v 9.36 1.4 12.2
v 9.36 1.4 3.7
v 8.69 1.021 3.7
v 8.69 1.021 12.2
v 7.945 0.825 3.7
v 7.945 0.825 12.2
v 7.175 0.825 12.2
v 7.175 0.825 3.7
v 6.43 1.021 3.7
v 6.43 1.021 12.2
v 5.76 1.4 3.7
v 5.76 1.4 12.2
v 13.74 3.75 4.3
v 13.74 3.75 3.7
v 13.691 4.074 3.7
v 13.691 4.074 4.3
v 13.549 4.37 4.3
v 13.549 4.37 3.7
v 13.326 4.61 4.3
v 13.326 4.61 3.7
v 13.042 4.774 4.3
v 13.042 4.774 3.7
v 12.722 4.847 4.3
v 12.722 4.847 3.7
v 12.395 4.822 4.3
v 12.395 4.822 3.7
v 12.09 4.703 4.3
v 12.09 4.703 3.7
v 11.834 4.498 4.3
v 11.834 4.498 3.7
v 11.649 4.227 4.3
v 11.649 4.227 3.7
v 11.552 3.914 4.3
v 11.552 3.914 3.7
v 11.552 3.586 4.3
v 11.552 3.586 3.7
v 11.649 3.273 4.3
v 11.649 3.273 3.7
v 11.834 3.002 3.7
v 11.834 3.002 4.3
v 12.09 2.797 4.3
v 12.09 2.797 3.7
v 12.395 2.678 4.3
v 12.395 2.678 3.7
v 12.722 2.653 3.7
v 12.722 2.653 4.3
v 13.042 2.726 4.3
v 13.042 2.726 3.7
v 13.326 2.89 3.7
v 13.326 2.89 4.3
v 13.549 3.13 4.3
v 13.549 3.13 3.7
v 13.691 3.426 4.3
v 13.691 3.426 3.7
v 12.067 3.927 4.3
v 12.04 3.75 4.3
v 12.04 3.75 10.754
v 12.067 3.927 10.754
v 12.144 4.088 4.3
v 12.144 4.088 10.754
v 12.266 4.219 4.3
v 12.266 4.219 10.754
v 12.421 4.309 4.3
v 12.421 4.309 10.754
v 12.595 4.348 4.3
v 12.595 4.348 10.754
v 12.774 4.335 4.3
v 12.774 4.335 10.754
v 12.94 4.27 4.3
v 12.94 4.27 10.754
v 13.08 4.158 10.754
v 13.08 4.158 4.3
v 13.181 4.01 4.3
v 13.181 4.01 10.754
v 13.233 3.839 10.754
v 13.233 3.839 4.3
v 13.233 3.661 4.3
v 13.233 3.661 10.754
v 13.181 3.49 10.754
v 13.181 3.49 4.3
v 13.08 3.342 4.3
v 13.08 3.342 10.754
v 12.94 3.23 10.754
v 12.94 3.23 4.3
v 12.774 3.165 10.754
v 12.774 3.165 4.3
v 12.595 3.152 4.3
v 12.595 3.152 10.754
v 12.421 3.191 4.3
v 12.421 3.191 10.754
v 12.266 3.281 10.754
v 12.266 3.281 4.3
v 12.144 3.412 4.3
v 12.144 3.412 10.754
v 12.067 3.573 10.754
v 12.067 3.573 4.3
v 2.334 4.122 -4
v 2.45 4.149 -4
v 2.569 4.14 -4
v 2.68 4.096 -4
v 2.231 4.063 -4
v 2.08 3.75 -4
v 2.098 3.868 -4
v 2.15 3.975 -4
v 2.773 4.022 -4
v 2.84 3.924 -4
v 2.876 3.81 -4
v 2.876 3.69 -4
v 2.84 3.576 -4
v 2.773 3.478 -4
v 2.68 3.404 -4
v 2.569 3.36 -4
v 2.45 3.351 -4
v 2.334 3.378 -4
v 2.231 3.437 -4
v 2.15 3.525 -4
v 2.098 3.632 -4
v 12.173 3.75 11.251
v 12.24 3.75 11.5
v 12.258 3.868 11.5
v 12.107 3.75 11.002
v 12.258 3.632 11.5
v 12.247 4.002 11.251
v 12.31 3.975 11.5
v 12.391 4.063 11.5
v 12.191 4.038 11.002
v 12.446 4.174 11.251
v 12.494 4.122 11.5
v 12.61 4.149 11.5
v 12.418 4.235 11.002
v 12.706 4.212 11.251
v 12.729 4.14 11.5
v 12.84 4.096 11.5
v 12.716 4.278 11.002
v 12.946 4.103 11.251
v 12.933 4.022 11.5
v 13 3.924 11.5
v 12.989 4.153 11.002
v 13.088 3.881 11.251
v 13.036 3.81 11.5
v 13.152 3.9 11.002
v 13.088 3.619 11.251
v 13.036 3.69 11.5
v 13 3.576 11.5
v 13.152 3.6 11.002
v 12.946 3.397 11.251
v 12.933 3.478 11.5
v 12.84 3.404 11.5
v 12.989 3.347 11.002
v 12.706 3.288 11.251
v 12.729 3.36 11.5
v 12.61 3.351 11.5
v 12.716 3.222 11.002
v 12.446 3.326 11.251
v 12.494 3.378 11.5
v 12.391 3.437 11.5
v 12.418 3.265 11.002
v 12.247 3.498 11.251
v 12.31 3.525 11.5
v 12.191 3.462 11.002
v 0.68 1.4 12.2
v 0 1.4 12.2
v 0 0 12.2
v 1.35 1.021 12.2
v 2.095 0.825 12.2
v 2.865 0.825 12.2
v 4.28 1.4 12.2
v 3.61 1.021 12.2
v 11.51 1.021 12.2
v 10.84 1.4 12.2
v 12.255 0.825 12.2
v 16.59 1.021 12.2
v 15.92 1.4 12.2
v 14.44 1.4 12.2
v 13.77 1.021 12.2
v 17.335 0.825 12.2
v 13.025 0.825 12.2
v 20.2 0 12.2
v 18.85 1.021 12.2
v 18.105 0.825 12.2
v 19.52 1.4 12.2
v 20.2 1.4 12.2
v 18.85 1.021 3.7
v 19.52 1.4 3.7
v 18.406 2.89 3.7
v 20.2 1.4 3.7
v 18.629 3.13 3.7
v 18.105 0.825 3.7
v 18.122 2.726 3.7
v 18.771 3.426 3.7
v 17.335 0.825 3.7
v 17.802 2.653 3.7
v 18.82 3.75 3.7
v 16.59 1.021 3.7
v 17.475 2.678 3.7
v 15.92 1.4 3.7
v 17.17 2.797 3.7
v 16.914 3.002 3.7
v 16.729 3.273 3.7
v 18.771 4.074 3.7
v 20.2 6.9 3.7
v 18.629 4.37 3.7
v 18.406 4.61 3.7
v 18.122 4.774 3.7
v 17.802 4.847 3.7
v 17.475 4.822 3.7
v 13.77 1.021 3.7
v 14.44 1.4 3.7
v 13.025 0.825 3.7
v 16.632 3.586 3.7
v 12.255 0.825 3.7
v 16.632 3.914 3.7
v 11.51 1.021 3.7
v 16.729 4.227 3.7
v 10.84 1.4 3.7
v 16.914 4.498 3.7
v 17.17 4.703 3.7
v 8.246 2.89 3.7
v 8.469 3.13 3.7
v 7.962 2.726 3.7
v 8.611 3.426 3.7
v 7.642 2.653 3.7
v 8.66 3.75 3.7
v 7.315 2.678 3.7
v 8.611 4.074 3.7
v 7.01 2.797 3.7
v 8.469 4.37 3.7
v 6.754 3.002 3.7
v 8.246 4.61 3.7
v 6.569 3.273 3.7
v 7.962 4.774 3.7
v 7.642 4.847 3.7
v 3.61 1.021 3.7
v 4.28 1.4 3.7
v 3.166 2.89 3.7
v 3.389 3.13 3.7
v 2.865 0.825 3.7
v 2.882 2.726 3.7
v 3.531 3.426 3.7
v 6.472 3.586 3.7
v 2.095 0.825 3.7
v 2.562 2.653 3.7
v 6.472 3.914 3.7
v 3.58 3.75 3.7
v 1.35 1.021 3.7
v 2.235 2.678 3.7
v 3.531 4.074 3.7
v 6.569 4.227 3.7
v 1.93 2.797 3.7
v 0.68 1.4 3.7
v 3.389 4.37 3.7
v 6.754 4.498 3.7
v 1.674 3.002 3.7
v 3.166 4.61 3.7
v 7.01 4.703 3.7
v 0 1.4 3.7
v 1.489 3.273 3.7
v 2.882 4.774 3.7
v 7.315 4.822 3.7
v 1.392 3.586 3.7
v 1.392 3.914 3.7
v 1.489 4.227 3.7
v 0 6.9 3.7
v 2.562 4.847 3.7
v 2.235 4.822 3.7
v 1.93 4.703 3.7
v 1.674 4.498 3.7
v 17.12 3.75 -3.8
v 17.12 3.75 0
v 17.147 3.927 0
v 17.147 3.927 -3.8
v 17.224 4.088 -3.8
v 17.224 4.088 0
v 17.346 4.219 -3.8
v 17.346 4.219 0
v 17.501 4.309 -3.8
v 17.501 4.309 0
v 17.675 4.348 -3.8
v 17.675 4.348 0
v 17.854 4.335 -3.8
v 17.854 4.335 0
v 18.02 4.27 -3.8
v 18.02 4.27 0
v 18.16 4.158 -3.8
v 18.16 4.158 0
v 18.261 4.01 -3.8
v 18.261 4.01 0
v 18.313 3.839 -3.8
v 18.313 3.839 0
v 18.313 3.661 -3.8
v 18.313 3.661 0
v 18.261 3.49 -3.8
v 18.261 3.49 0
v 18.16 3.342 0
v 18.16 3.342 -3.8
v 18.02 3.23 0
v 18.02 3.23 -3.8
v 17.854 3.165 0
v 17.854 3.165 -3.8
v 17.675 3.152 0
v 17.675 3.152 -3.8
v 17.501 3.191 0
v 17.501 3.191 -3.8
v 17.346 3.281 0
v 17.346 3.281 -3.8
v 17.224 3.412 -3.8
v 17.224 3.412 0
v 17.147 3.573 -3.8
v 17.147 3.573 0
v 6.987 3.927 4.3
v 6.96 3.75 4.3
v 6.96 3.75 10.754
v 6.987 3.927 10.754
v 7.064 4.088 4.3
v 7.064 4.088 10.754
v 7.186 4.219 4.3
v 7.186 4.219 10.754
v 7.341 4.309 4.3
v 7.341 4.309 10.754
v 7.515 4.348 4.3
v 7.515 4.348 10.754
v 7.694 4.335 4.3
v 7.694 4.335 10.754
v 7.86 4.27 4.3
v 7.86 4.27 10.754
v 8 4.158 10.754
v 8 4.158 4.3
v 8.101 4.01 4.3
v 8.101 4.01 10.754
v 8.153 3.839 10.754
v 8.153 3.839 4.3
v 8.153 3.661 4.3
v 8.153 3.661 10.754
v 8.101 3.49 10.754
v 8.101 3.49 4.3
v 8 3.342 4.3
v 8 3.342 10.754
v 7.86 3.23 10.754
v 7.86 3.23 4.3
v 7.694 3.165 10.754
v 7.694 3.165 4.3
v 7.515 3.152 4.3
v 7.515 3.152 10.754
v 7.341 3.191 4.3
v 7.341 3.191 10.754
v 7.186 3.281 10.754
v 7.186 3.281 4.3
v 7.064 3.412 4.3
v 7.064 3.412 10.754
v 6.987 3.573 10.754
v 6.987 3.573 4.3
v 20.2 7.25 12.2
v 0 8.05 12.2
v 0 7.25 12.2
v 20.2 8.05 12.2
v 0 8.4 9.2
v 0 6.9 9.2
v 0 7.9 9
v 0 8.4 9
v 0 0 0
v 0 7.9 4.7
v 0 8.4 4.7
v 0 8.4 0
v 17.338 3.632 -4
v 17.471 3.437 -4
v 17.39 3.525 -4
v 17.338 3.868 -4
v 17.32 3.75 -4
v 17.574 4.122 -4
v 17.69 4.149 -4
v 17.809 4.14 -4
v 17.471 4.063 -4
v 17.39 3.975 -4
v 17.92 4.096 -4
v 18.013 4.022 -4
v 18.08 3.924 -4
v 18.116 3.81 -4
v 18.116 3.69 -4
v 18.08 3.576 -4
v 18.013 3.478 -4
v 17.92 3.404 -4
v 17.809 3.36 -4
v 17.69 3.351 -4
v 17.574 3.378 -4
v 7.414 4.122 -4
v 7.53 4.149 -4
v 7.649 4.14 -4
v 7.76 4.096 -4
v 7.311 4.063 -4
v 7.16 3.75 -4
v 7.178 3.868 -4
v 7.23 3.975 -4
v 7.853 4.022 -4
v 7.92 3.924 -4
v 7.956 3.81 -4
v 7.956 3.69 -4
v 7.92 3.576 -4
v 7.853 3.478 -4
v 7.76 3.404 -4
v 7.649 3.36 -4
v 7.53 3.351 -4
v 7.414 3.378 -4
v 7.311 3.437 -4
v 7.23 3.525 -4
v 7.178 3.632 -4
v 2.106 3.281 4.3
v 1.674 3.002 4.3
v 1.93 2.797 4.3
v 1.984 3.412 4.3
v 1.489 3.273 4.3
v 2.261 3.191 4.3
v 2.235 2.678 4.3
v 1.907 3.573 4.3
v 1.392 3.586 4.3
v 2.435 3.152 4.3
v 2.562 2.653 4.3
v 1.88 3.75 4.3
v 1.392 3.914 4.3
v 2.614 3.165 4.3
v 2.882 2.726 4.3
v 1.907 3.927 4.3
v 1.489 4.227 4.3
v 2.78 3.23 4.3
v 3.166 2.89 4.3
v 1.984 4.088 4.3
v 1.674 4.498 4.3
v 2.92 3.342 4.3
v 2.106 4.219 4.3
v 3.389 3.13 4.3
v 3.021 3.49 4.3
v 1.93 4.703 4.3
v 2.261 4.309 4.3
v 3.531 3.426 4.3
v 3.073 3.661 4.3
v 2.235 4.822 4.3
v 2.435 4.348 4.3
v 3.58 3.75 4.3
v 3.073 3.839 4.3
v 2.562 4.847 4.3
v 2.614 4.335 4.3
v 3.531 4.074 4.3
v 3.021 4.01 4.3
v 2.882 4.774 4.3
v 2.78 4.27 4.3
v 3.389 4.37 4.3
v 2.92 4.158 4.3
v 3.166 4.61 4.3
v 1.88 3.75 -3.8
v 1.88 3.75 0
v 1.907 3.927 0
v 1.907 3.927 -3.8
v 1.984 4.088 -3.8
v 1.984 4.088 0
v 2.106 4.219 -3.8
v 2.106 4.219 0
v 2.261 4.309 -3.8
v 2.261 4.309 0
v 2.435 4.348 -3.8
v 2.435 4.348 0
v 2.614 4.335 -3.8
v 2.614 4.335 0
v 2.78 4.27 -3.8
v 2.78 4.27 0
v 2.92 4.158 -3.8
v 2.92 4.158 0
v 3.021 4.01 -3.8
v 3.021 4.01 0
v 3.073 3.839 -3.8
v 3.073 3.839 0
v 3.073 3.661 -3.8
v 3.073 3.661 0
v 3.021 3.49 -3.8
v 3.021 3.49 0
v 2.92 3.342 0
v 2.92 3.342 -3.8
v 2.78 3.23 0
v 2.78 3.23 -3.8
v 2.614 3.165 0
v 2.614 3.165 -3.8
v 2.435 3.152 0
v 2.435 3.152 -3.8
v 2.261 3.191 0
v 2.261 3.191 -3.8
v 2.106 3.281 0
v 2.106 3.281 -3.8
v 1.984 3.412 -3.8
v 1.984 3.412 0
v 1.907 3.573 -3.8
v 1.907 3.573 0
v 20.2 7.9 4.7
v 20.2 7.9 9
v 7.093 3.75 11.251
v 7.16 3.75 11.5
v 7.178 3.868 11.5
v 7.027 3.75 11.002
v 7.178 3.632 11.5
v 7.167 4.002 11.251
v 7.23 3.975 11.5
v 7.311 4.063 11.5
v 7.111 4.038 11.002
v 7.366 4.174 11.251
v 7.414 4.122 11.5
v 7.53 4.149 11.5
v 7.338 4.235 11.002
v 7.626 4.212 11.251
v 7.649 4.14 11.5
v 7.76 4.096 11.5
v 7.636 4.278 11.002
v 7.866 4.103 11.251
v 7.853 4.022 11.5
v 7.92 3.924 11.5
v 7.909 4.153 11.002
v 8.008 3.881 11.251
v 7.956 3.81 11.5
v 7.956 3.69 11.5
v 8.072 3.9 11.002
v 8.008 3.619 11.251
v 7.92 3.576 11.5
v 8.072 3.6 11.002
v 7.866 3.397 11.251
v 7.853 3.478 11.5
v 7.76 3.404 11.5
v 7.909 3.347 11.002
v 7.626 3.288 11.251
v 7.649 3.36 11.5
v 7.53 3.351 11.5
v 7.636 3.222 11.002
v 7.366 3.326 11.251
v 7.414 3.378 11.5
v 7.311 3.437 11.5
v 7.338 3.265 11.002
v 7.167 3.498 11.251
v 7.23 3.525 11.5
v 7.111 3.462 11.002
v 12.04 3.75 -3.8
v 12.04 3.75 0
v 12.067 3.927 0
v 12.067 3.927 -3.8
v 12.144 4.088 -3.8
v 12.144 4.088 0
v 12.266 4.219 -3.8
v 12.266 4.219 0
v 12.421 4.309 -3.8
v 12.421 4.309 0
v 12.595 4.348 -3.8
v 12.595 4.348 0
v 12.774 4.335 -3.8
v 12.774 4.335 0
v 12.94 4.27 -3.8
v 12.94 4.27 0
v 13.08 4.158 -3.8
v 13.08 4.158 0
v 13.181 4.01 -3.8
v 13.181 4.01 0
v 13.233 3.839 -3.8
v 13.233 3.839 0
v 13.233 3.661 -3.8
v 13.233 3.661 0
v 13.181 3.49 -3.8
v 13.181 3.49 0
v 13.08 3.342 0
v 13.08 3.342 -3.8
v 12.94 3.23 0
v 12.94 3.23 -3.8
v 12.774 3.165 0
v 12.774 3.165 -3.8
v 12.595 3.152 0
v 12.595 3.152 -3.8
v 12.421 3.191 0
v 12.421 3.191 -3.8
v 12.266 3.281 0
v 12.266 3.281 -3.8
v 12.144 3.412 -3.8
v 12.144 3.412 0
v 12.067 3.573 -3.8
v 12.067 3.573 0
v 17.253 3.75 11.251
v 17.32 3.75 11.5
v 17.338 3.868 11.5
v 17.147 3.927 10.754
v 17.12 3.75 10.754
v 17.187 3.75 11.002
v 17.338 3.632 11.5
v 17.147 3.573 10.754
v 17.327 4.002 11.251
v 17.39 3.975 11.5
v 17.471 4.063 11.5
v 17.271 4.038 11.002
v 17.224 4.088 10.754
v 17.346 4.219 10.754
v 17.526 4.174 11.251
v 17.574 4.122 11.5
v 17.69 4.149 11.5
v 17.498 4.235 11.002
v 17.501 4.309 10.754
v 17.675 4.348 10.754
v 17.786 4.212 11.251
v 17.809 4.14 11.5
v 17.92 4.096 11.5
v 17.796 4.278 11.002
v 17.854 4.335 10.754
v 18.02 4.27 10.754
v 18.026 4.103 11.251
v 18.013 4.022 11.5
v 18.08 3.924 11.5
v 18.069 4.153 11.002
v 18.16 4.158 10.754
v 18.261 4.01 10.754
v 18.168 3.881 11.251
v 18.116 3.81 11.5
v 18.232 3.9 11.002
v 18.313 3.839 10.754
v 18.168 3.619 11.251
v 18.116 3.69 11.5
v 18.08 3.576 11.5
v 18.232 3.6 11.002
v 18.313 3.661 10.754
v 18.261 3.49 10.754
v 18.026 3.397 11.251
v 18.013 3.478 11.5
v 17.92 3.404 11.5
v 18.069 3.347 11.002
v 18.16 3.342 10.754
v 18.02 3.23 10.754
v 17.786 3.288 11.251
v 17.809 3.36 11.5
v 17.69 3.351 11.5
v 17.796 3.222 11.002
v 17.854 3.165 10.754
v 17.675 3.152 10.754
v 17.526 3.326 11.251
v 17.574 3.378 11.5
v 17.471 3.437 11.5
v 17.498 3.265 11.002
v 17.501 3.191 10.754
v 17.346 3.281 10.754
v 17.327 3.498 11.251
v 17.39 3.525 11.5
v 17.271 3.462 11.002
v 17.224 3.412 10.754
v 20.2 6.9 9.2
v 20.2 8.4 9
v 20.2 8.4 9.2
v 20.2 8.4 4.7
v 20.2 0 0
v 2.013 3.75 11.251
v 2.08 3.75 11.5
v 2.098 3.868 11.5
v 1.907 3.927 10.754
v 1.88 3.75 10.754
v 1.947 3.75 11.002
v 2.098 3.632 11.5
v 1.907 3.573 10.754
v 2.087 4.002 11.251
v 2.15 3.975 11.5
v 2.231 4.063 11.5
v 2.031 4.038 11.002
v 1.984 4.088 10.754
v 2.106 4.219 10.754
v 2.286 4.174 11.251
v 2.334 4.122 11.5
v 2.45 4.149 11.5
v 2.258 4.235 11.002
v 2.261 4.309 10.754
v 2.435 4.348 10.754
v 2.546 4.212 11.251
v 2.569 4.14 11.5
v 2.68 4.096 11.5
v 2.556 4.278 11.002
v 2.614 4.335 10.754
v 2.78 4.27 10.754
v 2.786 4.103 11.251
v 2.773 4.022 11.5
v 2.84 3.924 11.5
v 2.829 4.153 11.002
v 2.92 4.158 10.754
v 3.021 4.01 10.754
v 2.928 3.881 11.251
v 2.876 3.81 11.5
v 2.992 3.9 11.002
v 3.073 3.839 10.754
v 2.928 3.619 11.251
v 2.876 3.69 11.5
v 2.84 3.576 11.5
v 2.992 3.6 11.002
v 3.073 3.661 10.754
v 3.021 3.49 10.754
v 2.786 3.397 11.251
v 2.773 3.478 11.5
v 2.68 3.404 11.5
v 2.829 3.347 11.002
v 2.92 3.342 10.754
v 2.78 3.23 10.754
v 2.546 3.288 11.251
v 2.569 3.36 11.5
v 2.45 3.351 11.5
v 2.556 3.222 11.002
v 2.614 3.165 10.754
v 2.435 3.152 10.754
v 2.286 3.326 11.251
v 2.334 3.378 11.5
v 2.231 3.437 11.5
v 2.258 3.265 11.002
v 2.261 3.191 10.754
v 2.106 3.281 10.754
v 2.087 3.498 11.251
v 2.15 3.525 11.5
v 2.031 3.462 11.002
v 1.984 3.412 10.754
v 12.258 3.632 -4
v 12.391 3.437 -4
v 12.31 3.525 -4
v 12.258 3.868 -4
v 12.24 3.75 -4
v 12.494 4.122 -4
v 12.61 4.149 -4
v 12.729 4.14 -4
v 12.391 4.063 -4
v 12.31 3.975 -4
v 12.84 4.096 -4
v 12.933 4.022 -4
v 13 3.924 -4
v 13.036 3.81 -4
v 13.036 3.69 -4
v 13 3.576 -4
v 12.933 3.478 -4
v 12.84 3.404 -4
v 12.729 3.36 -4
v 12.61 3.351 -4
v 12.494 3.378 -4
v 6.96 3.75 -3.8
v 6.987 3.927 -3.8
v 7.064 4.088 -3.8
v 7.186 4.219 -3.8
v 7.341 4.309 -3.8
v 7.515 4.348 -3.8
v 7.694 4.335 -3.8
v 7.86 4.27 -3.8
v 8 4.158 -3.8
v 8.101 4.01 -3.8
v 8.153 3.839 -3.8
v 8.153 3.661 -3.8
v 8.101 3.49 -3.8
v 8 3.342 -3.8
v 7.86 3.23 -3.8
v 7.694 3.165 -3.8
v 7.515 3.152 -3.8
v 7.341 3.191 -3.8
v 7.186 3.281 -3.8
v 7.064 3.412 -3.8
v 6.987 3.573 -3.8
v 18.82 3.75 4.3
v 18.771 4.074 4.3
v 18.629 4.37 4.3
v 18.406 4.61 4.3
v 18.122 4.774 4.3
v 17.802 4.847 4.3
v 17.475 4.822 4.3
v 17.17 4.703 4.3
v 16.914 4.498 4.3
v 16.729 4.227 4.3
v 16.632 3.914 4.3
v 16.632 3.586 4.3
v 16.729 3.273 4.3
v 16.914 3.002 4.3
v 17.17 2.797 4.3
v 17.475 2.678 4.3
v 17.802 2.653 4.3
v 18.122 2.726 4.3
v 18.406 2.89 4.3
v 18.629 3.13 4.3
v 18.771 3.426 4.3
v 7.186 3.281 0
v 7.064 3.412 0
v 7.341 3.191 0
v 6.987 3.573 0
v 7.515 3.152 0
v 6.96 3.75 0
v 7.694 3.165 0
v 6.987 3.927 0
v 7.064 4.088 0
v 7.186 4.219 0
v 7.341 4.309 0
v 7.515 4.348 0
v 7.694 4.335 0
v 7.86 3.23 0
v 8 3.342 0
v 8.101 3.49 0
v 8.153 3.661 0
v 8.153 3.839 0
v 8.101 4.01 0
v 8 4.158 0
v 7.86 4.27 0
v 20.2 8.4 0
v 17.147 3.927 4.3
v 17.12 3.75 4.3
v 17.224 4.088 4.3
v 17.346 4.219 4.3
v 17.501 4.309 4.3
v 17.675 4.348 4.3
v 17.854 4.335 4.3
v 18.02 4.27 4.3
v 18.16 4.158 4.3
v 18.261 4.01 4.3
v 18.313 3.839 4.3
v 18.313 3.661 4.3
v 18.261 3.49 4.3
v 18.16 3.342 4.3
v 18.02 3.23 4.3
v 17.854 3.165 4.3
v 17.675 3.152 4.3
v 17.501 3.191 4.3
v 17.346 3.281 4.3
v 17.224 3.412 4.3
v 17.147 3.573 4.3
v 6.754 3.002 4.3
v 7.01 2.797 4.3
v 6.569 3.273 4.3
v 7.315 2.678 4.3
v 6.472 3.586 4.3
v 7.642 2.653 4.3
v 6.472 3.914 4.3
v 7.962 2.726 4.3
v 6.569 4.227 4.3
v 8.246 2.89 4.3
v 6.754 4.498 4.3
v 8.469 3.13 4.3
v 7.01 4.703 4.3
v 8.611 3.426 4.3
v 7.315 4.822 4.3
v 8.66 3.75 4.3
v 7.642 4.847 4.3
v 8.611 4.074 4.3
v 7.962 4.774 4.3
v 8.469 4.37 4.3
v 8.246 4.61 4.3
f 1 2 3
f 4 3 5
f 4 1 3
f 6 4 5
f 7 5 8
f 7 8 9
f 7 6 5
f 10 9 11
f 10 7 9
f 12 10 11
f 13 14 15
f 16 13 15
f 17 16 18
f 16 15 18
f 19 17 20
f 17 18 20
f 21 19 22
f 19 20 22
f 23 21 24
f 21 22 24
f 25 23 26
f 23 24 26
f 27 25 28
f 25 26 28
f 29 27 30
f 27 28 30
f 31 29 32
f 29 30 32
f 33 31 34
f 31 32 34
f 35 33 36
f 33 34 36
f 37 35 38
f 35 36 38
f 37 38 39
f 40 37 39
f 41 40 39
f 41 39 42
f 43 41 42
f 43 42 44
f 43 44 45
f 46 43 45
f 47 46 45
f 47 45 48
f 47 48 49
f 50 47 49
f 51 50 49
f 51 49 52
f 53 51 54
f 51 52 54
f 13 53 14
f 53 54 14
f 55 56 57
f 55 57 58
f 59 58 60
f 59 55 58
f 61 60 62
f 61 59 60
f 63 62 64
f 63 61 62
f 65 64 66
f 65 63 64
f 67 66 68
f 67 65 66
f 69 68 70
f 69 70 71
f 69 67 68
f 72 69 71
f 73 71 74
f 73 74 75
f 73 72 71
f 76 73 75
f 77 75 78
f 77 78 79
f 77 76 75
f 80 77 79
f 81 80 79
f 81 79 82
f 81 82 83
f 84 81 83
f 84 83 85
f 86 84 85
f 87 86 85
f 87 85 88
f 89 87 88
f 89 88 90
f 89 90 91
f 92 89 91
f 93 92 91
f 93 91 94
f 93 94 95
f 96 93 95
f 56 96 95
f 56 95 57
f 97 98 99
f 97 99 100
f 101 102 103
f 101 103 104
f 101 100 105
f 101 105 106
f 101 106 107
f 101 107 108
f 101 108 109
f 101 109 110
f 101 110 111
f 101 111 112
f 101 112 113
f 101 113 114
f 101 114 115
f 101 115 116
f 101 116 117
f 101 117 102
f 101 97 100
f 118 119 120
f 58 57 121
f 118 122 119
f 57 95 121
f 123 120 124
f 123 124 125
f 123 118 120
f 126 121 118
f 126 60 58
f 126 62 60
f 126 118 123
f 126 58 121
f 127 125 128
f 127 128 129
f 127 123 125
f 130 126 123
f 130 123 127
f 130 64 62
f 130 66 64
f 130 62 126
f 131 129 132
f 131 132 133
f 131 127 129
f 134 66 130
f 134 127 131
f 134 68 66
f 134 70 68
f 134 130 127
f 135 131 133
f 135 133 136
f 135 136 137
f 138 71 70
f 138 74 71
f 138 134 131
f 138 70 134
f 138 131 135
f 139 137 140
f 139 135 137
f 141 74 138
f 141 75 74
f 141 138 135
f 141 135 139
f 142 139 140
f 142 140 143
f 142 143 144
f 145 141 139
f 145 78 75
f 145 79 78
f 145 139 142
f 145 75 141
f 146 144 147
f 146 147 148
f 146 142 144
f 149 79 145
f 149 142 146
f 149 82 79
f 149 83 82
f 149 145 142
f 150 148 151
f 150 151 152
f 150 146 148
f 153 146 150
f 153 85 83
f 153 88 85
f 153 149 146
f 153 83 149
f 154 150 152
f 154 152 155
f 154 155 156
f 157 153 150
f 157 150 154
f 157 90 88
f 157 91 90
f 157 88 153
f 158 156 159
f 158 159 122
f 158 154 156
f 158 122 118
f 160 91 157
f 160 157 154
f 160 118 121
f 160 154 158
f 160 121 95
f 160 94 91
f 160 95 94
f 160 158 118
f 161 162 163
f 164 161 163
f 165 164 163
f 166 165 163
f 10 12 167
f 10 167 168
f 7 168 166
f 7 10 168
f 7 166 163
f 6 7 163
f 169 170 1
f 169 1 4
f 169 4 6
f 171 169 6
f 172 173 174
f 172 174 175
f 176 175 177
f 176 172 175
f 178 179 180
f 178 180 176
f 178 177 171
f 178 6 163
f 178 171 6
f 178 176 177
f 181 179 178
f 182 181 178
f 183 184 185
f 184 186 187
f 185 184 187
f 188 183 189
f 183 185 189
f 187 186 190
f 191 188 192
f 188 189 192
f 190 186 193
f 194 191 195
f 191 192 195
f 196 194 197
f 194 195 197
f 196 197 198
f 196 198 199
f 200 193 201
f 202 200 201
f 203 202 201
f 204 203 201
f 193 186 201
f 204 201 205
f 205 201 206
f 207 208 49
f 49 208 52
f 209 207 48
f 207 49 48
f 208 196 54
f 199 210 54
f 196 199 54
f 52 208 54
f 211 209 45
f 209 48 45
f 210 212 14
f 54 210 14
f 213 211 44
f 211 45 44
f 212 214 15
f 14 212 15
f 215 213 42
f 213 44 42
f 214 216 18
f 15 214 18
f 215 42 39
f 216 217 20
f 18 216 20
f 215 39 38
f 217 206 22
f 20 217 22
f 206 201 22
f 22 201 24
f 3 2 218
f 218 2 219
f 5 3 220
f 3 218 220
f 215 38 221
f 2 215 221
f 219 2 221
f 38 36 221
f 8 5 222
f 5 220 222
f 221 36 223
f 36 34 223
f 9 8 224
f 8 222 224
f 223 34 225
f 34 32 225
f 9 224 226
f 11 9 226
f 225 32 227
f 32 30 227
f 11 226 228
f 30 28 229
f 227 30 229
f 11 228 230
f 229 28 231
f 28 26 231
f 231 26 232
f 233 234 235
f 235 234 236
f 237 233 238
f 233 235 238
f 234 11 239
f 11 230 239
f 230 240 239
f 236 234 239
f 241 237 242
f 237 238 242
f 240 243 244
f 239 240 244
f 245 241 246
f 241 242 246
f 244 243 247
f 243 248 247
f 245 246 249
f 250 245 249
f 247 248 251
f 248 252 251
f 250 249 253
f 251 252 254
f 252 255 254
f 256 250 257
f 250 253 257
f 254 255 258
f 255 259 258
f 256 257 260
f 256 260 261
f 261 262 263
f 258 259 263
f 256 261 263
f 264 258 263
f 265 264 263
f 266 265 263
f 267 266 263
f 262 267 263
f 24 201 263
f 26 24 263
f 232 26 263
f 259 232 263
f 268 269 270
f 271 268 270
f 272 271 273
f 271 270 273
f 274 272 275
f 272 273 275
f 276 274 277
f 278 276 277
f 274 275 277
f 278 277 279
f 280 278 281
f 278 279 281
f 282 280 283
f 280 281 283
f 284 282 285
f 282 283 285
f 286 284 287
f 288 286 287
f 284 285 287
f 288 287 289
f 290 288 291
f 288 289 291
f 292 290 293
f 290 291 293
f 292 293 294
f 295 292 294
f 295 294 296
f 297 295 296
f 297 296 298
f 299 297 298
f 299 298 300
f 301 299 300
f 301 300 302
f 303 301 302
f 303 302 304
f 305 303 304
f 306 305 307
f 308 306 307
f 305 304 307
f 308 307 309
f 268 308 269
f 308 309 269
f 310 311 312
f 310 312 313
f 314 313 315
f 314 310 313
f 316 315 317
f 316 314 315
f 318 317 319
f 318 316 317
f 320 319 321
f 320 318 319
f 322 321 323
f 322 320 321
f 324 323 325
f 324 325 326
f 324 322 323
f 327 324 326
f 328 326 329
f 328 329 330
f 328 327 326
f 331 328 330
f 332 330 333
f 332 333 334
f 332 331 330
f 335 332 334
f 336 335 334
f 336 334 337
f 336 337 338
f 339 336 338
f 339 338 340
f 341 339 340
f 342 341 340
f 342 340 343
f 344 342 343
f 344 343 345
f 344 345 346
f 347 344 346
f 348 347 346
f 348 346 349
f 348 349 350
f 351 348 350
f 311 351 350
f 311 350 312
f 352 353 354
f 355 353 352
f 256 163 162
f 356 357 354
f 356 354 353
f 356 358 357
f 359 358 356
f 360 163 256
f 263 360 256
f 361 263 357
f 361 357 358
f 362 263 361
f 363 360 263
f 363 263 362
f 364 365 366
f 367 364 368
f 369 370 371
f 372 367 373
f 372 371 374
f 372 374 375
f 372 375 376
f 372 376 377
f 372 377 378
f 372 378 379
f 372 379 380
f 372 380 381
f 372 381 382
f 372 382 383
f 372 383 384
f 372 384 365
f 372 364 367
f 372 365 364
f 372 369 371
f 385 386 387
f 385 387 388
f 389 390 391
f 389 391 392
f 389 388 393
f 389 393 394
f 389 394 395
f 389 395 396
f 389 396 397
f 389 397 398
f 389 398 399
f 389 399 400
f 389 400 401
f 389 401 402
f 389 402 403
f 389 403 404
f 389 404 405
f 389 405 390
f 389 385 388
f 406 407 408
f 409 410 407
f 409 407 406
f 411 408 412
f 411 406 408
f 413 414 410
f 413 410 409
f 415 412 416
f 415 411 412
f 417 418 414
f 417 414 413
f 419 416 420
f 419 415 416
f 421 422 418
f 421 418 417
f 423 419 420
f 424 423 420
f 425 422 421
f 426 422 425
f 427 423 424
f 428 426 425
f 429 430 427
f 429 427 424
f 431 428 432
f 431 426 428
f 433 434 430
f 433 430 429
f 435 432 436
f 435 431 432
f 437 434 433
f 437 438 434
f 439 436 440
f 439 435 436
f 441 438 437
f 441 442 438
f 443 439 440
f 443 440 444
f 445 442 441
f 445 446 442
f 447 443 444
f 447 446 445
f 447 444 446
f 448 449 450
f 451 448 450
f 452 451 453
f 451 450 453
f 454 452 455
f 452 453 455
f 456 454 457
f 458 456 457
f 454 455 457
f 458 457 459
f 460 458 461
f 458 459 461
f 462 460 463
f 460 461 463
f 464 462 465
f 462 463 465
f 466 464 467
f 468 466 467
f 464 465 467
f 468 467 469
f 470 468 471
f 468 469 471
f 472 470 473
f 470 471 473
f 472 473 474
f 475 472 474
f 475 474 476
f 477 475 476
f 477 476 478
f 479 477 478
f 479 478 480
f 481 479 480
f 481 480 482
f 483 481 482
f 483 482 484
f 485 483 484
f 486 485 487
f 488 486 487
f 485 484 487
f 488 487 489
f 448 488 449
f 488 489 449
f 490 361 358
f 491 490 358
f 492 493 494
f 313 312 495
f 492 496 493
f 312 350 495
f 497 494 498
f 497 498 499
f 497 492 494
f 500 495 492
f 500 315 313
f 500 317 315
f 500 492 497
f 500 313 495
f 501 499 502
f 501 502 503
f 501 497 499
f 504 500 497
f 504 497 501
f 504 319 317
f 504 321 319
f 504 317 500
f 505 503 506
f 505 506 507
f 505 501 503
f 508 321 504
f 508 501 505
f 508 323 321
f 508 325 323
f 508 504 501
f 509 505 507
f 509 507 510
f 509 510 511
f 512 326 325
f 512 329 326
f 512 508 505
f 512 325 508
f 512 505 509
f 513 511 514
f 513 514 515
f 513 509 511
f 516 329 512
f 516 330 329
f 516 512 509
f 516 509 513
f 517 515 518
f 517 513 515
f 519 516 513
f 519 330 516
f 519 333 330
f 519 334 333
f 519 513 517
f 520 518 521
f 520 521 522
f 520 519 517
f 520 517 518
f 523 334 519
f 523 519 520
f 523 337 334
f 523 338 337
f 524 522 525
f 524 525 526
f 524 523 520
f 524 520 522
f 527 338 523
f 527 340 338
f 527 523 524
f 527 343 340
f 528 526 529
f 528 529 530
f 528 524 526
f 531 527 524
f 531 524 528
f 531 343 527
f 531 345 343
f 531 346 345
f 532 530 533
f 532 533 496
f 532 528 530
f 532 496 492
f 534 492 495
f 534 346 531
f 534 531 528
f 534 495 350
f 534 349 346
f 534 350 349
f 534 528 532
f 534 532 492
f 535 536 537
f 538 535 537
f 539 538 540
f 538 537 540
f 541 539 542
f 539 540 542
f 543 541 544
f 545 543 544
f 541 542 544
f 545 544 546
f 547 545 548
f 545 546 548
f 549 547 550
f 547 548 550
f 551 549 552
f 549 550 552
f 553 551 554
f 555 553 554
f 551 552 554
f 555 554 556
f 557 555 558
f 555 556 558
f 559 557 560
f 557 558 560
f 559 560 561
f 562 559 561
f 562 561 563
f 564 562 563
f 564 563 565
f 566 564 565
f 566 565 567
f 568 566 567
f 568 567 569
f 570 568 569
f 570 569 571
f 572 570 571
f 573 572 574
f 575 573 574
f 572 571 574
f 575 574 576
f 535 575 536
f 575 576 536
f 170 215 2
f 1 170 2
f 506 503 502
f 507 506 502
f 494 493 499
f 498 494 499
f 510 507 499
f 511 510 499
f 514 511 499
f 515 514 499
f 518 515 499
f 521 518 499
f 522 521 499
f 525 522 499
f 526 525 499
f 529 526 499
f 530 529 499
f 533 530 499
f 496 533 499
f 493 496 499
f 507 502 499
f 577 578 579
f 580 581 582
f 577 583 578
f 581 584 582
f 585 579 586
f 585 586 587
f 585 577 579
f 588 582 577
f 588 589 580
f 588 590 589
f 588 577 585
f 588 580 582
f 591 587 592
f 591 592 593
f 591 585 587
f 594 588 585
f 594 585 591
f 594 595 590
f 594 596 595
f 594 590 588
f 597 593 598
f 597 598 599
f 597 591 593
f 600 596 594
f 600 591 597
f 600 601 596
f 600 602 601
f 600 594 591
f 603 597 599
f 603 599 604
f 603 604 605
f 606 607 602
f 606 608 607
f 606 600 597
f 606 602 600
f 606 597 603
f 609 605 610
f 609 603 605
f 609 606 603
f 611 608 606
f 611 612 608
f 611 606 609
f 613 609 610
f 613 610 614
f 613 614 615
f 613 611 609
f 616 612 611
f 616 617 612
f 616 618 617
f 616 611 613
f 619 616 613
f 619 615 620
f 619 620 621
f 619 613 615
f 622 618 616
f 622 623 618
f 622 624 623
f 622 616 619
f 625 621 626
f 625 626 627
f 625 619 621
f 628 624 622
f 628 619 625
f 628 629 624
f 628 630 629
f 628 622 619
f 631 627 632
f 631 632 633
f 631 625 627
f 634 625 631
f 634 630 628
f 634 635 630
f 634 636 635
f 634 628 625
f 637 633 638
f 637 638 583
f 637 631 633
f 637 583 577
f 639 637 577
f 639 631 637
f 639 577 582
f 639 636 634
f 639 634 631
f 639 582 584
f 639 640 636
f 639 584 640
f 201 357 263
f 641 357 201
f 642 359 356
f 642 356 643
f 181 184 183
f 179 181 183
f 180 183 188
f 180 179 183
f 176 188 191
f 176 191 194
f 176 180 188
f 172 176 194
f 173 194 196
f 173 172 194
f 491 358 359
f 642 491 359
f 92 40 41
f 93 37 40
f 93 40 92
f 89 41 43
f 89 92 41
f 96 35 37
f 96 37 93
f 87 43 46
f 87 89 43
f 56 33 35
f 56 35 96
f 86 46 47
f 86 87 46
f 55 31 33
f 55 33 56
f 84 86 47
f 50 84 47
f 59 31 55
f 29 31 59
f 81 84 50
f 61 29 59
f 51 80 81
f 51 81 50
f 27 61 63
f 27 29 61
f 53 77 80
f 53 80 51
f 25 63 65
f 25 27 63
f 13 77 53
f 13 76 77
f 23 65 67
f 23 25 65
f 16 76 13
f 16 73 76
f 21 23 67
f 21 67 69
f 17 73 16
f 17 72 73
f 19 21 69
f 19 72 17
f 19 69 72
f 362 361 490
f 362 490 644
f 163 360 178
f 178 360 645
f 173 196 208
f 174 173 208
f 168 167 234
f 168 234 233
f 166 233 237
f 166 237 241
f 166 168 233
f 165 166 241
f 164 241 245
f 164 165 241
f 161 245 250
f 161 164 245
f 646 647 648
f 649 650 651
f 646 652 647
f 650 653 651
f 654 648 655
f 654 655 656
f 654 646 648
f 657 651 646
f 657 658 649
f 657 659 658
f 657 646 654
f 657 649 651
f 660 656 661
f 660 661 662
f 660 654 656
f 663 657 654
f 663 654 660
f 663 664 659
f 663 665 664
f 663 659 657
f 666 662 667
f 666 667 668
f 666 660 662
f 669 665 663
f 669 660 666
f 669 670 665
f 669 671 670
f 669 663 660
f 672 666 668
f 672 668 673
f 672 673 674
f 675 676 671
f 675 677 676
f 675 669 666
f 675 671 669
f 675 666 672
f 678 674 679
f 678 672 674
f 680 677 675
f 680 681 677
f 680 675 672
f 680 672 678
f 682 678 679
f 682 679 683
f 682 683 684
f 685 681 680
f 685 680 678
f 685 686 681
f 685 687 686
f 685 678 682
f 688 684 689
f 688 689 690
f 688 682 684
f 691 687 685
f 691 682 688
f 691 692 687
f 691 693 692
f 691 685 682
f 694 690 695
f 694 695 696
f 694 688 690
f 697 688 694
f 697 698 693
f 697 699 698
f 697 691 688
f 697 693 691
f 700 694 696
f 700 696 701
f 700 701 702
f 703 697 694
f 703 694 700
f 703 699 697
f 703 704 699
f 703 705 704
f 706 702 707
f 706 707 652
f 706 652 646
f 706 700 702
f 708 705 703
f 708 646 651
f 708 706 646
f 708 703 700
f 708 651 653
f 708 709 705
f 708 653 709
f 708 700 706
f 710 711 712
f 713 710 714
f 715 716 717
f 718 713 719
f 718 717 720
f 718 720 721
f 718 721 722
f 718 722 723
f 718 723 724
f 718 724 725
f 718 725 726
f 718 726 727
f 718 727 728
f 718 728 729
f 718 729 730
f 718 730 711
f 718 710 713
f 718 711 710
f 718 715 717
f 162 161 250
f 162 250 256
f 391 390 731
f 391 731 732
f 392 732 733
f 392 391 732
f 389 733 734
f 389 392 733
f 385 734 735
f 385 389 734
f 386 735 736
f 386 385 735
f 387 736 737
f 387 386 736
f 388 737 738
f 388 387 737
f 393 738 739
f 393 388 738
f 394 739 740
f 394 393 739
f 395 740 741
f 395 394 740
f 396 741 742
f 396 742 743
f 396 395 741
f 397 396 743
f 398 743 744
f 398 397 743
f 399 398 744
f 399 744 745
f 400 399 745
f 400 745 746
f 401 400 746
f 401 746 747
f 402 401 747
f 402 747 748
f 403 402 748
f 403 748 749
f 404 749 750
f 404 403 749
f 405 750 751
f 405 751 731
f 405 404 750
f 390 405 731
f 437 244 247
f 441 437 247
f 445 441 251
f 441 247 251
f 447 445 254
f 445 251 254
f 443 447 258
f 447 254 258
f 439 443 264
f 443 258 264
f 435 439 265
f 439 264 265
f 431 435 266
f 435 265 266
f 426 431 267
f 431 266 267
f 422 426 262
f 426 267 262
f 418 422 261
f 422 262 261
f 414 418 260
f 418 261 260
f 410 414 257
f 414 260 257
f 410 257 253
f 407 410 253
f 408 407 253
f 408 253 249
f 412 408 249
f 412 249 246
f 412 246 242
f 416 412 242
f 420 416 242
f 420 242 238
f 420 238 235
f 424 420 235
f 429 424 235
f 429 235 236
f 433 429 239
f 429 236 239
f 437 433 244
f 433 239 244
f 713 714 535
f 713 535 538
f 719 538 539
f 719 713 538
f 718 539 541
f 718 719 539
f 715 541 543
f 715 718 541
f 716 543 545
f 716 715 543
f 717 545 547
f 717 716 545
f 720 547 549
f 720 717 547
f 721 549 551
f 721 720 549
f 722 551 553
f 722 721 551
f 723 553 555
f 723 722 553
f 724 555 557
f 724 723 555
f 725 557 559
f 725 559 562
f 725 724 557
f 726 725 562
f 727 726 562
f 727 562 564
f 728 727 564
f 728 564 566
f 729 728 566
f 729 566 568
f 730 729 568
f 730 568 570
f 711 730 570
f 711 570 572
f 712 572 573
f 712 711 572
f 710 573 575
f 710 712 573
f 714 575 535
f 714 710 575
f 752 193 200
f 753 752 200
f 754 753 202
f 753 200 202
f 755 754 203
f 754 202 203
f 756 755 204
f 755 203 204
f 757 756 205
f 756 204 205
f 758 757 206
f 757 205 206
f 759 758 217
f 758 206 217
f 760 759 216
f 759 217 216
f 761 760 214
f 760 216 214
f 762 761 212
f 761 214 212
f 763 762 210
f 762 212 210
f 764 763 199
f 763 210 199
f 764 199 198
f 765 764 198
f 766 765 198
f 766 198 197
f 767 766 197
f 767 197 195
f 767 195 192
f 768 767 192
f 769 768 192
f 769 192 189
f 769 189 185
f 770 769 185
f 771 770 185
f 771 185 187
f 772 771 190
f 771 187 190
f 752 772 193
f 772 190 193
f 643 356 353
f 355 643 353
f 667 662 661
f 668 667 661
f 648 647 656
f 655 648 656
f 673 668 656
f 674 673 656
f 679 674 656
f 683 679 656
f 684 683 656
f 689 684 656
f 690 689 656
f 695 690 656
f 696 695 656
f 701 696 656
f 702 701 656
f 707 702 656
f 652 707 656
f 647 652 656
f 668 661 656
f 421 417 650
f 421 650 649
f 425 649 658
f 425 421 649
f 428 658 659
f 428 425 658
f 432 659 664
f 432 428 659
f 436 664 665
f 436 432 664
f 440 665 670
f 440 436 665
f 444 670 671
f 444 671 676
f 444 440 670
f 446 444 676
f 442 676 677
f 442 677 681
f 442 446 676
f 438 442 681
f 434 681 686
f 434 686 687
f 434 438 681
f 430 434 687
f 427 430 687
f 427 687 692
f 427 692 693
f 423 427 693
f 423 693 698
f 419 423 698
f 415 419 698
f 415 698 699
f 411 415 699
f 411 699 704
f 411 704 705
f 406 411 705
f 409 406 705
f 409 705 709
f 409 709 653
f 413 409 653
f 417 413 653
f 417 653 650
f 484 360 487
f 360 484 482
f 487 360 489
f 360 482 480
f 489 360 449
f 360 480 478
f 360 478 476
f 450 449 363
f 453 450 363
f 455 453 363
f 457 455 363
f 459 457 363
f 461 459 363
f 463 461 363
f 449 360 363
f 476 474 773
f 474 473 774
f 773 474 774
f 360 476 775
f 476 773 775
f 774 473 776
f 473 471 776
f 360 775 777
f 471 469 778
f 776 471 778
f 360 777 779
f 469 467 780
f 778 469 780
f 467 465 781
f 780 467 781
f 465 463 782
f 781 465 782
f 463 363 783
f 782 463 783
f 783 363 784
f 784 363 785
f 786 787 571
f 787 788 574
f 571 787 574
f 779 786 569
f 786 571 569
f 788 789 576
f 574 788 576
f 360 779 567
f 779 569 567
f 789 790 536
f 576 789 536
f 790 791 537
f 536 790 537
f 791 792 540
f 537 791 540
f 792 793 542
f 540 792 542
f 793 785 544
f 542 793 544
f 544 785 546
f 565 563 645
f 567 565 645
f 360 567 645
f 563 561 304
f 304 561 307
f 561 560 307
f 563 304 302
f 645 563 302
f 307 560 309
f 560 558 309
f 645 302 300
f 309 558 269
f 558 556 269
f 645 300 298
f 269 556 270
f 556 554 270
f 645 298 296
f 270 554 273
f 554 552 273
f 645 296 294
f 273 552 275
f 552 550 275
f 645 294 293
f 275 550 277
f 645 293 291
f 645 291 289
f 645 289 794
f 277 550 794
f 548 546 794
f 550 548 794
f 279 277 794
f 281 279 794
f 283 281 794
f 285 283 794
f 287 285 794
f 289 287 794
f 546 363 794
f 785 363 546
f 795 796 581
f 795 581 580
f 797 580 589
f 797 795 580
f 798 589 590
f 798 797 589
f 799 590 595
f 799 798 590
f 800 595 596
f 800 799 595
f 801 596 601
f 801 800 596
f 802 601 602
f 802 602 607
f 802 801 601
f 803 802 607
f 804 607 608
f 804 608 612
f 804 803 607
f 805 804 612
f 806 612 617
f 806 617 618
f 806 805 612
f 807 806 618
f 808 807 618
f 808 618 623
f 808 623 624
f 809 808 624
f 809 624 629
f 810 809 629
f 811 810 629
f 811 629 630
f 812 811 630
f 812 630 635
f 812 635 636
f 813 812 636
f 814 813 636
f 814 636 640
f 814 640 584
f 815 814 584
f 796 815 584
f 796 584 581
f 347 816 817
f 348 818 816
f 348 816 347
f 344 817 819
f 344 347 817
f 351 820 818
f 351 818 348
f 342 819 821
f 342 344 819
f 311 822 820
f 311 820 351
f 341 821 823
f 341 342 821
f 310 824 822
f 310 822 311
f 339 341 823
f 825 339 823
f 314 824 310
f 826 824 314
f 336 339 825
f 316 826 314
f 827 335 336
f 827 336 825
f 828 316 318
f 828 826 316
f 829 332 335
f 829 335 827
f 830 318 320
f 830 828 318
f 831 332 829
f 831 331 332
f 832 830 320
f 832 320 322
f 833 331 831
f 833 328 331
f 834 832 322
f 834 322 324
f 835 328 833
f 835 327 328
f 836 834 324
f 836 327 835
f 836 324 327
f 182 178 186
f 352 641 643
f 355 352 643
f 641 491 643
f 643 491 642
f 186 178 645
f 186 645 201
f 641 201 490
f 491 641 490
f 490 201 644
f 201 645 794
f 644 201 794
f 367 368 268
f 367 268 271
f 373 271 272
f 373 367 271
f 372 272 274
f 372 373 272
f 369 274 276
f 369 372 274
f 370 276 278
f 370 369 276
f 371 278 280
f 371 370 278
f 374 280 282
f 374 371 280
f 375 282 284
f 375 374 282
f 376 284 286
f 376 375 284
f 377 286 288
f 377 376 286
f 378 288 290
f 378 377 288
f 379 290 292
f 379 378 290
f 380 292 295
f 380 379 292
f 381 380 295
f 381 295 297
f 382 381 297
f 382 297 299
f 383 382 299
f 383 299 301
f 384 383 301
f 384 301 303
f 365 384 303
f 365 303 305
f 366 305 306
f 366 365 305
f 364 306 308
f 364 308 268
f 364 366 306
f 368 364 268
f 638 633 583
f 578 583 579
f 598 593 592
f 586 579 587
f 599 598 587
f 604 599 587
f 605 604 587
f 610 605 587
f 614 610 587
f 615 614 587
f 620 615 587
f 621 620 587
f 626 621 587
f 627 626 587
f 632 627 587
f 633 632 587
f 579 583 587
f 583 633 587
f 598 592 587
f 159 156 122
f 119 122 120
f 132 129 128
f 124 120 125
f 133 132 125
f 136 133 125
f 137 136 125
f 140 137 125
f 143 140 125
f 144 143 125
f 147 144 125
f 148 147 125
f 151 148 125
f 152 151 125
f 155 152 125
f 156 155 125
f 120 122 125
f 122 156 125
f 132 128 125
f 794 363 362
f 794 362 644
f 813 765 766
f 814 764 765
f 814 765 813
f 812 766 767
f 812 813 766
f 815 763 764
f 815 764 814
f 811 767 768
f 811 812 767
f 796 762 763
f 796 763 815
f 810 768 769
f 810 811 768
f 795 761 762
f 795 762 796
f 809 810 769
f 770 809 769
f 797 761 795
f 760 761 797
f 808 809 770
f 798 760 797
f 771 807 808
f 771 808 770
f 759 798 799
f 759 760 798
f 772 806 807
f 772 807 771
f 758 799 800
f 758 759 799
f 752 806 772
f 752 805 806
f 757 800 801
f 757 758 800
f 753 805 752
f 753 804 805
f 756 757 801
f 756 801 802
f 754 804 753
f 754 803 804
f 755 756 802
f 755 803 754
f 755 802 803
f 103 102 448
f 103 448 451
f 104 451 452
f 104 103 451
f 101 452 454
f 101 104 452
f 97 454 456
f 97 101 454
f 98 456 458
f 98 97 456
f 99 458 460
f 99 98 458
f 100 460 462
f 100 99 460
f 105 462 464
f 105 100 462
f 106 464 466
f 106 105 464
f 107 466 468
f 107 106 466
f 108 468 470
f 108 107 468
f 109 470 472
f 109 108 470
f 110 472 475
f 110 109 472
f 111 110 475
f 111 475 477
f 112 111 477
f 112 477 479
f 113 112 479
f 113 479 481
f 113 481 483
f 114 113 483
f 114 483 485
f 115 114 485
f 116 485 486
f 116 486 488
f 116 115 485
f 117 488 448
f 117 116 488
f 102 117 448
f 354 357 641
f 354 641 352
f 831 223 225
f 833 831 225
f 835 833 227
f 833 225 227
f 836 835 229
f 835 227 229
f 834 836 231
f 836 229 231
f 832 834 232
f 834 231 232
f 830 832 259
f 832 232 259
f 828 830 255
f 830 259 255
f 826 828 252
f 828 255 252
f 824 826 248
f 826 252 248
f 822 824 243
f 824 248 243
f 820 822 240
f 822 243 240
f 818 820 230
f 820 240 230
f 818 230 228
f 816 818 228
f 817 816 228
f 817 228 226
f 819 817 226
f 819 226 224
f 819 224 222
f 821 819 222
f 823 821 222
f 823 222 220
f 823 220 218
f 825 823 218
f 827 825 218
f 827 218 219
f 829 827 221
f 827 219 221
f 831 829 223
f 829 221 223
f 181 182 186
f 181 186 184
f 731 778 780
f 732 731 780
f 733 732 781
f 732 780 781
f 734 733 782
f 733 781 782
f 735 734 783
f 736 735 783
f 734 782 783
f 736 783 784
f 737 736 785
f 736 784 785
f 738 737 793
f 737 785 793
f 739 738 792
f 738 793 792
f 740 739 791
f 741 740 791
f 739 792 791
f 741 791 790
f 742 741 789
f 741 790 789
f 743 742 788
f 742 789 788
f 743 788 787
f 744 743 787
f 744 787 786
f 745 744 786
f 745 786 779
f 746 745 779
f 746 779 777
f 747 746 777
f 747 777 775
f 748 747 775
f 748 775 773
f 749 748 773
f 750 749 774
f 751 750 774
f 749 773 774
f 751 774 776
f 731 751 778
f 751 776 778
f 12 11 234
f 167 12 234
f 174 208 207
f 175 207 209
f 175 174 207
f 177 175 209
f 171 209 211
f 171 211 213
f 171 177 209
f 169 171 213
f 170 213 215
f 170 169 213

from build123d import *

# Parameters (mm, degrees)
ESQUISSE1_W             = 20.2
ESQUISSE1_H             = 8.4
BOSS_EXTRU_1_DEPTH      = 12.2
ENL_V_MAT_EXTRU_1_DEPTH = 8.5
ESQUISSE3_W             = 4.3
ESQUISSE3_H             = 0.5
ENL_V_MAT_EXTRU_2_DEPTH = 21.2
ESQUISSE4_R             = 0.6
BOSS_EXTRU_2_DEPTH      = 4
BOSS_EXTRU_2_DEPTH_BACK = 11.5
CHANFREIN1_SIZE         = 0.2
CHANFREIN1_SIZE2        = 0.746410162
CHANFREIN1_PART_2_SIZE  = 0.2
CHANFREIN1_PART_2_SIZE2 = 0.746410162
CHANFREIN1_PART_3_SIZE  = 0.2
CHANFREIN1_PART_3_SIZE2 = 0.746410162
CHANFREIN1_PART_4_SIZE  = 0.2
CHANFREIN1_PART_4_SIZE2 = 0.746410162
CHANFREIN2_SIZE         = 0.2
ESQUISSE5_R             = 1.1
BOSS_EXTRU_3_DEPTH      = 0.6


with BuildPart() as part:
    # Esquisse1 → Boss.-Extru.1 (new body)
    with BuildSketch(Plane.XY):
        with Locations((10.1, 4.2)):
            Rectangle(ESQUISSE1_W, ESQUISSE1_H)
    extrude(amount=BOSS_EXTRU_1_DEPTH)

    # Esquisse2 → Enlèv. mat.-Extru.1 (cut)
    with BuildSketch(Plane.XY.offset(12.2)):
        with BuildLine():
            Line((0, 1.4), (0, 6.9))
            Line((0, 6.9), (20.2, 6.9))
            Line((20.2, 6.9), (20.2, 1.4))
            Line((20.2, 1.4), (19.52, 1.4))
            ThreePointArc((19.52, 1.4), (17.72, 0.8), (15.92, 1.4))
            Line((15.92, 1.4), (14.44, 1.4))
            ThreePointArc((14.44, 1.4), (12.64, 0.8), (10.84, 1.4))
            Line((10.84, 1.4), (9.36, 1.4))
            ThreePointArc((9.36, 1.4), (7.56, 0.8), (5.76, 1.4))
            Line((5.76, 1.4), (4.28, 1.4))
            ThreePointArc((4.28, 1.4), (2.48, 0.8), (0.68, 1.4))
            Line((0.68, 1.4), (0, 1.4))
        make_face()
    extrude(amount=-ENL_V_MAT_EXTRU_1_DEPTH, mode=Mode.SUBTRACT)

    # Esquisse3 → Enlèv. mat.-Extru.2 (cut, through all)
    with BuildSketch(Plane.ZY):
        with Locations((6.85, 8.15)):
            Rectangle(ESQUISSE3_W, ESQUISSE3_H)
        Polygon((12.2, 8.4), (9.2, 8.4), (12.2, 8.05), align=None)
        Polygon((12.2, 7.25), (12.2, 6.9), (9.2, 6.9), align=None)
    extrude(amount=-ENL_V_MAT_EXTRU_2_DEPTH, mode=Mode.SUBTRACT)

    # Esquisse4 → Boss.-Extru.2 (add, two sides)
    with BuildSketch(Plane(origin=(0, 0, 0), x_dir=(-1, 0, 0), z_dir=(0, 0, -1))) as boss_extru_2_sk:
        with Locations((-17.72, 3.75)):
            Circle(ESQUISSE4_R)
        with Locations((-12.64, 3.75)):
            Circle(ESQUISSE4_R)
        with Locations((-2.48, 3.75)):
            Circle(ESQUISSE4_R)
        with Locations((-7.56, 3.75)):
            Circle(ESQUISSE4_R)
    extrude(amount=BOSS_EXTRU_2_DEPTH)
    extrude(boss_extru_2_sk.sketch, amount=-BOSS_EXTRU_2_DEPTH_BACK)

    # Chanfrein1
    chanfrein1_edges = [part.edges().sort_by_distance(p)[0] for p in [
        (8.16, 3.75, 11.5),
    ]]
    chanfrein1_side = [part.faces().sort_by_distance(p)[0] for p in [
        (7.56, 3.75, 11.5),
    ]]
    chamfer(chanfrein1_edges, length=CHANFREIN1_SIZE, length2=CHANFREIN1_SIZE2, reference=chanfrein1_side[0])

    # Chanfrein1 part 2
    chanfrein1_part_2_edges = [part.edges().sort_by_distance(p)[0] for p in [
        (18.32, 3.75, 11.5),
    ]]
    chanfrein1_part_2_side = [part.faces().sort_by_distance(p)[0] for p in [
        (17.72, 3.75, 11.5),
    ]]
    chamfer(chanfrein1_part_2_edges, length=CHANFREIN1_PART_2_SIZE, length2=CHANFREIN1_PART_2_SIZE2, reference=chanfrein1_part_2_side[0])

    # Chanfrein1 part 3
    chanfrein1_part_3_edges = [part.edges().sort_by_distance(p)[0] for p in [
        (13.24, 3.75, 11.5),
    ]]
    chanfrein1_part_3_side = [part.faces().sort_by_distance(p)[0] for p in [
        (12.64, 3.75, 11.5),
    ]]
    chamfer(chanfrein1_part_3_edges, length=CHANFREIN1_PART_3_SIZE, length2=CHANFREIN1_PART_3_SIZE2, reference=chanfrein1_part_3_side[0])

    # Chanfrein1 part 4
    chanfrein1_part_4_edges = [part.edges().sort_by_distance(p)[0] for p in [
        (3.08, 3.75, 11.5),
    ]]
    chanfrein1_part_4_side = [part.faces().sort_by_distance(p)[0] for p in [
        (2.48, 3.75, 11.5),
    ]]
    chamfer(chanfrein1_part_4_edges, length=CHANFREIN1_PART_4_SIZE, length2=CHANFREIN1_PART_4_SIZE2, reference=chanfrein1_part_4_side[0])

    # Chanfrein2
    chanfrein2_edges = [part.edges().sort_by_distance(p)[0] for p in [
        (8.16, 3.75, -4),
        (18.32, 3.75, -4),
        (13.24, 3.75, -4),
        (3.08, 3.75, -4),
    ]]
    chamfer(chanfrein2_edges, length=CHANFREIN2_SIZE)

    # Esquisse5 → Boss.-Extru.3 (add)
    with BuildSketch(Plane.XY.offset(3.7)):
        with Locations((12.64, 3.75)):
            Circle(ESQUISSE5_R)
        with Locations((17.72, 3.75)):
            Circle(ESQUISSE5_R)
        with Locations((7.56, 3.75)):
            Circle(ESQUISSE5_R)
        with Locations((2.48, 3.75)):
            Circle(ESQUISSE5_R)
    extrude(amount=BOSS_EXTRU_3_DEPTH)


solid = part.part
